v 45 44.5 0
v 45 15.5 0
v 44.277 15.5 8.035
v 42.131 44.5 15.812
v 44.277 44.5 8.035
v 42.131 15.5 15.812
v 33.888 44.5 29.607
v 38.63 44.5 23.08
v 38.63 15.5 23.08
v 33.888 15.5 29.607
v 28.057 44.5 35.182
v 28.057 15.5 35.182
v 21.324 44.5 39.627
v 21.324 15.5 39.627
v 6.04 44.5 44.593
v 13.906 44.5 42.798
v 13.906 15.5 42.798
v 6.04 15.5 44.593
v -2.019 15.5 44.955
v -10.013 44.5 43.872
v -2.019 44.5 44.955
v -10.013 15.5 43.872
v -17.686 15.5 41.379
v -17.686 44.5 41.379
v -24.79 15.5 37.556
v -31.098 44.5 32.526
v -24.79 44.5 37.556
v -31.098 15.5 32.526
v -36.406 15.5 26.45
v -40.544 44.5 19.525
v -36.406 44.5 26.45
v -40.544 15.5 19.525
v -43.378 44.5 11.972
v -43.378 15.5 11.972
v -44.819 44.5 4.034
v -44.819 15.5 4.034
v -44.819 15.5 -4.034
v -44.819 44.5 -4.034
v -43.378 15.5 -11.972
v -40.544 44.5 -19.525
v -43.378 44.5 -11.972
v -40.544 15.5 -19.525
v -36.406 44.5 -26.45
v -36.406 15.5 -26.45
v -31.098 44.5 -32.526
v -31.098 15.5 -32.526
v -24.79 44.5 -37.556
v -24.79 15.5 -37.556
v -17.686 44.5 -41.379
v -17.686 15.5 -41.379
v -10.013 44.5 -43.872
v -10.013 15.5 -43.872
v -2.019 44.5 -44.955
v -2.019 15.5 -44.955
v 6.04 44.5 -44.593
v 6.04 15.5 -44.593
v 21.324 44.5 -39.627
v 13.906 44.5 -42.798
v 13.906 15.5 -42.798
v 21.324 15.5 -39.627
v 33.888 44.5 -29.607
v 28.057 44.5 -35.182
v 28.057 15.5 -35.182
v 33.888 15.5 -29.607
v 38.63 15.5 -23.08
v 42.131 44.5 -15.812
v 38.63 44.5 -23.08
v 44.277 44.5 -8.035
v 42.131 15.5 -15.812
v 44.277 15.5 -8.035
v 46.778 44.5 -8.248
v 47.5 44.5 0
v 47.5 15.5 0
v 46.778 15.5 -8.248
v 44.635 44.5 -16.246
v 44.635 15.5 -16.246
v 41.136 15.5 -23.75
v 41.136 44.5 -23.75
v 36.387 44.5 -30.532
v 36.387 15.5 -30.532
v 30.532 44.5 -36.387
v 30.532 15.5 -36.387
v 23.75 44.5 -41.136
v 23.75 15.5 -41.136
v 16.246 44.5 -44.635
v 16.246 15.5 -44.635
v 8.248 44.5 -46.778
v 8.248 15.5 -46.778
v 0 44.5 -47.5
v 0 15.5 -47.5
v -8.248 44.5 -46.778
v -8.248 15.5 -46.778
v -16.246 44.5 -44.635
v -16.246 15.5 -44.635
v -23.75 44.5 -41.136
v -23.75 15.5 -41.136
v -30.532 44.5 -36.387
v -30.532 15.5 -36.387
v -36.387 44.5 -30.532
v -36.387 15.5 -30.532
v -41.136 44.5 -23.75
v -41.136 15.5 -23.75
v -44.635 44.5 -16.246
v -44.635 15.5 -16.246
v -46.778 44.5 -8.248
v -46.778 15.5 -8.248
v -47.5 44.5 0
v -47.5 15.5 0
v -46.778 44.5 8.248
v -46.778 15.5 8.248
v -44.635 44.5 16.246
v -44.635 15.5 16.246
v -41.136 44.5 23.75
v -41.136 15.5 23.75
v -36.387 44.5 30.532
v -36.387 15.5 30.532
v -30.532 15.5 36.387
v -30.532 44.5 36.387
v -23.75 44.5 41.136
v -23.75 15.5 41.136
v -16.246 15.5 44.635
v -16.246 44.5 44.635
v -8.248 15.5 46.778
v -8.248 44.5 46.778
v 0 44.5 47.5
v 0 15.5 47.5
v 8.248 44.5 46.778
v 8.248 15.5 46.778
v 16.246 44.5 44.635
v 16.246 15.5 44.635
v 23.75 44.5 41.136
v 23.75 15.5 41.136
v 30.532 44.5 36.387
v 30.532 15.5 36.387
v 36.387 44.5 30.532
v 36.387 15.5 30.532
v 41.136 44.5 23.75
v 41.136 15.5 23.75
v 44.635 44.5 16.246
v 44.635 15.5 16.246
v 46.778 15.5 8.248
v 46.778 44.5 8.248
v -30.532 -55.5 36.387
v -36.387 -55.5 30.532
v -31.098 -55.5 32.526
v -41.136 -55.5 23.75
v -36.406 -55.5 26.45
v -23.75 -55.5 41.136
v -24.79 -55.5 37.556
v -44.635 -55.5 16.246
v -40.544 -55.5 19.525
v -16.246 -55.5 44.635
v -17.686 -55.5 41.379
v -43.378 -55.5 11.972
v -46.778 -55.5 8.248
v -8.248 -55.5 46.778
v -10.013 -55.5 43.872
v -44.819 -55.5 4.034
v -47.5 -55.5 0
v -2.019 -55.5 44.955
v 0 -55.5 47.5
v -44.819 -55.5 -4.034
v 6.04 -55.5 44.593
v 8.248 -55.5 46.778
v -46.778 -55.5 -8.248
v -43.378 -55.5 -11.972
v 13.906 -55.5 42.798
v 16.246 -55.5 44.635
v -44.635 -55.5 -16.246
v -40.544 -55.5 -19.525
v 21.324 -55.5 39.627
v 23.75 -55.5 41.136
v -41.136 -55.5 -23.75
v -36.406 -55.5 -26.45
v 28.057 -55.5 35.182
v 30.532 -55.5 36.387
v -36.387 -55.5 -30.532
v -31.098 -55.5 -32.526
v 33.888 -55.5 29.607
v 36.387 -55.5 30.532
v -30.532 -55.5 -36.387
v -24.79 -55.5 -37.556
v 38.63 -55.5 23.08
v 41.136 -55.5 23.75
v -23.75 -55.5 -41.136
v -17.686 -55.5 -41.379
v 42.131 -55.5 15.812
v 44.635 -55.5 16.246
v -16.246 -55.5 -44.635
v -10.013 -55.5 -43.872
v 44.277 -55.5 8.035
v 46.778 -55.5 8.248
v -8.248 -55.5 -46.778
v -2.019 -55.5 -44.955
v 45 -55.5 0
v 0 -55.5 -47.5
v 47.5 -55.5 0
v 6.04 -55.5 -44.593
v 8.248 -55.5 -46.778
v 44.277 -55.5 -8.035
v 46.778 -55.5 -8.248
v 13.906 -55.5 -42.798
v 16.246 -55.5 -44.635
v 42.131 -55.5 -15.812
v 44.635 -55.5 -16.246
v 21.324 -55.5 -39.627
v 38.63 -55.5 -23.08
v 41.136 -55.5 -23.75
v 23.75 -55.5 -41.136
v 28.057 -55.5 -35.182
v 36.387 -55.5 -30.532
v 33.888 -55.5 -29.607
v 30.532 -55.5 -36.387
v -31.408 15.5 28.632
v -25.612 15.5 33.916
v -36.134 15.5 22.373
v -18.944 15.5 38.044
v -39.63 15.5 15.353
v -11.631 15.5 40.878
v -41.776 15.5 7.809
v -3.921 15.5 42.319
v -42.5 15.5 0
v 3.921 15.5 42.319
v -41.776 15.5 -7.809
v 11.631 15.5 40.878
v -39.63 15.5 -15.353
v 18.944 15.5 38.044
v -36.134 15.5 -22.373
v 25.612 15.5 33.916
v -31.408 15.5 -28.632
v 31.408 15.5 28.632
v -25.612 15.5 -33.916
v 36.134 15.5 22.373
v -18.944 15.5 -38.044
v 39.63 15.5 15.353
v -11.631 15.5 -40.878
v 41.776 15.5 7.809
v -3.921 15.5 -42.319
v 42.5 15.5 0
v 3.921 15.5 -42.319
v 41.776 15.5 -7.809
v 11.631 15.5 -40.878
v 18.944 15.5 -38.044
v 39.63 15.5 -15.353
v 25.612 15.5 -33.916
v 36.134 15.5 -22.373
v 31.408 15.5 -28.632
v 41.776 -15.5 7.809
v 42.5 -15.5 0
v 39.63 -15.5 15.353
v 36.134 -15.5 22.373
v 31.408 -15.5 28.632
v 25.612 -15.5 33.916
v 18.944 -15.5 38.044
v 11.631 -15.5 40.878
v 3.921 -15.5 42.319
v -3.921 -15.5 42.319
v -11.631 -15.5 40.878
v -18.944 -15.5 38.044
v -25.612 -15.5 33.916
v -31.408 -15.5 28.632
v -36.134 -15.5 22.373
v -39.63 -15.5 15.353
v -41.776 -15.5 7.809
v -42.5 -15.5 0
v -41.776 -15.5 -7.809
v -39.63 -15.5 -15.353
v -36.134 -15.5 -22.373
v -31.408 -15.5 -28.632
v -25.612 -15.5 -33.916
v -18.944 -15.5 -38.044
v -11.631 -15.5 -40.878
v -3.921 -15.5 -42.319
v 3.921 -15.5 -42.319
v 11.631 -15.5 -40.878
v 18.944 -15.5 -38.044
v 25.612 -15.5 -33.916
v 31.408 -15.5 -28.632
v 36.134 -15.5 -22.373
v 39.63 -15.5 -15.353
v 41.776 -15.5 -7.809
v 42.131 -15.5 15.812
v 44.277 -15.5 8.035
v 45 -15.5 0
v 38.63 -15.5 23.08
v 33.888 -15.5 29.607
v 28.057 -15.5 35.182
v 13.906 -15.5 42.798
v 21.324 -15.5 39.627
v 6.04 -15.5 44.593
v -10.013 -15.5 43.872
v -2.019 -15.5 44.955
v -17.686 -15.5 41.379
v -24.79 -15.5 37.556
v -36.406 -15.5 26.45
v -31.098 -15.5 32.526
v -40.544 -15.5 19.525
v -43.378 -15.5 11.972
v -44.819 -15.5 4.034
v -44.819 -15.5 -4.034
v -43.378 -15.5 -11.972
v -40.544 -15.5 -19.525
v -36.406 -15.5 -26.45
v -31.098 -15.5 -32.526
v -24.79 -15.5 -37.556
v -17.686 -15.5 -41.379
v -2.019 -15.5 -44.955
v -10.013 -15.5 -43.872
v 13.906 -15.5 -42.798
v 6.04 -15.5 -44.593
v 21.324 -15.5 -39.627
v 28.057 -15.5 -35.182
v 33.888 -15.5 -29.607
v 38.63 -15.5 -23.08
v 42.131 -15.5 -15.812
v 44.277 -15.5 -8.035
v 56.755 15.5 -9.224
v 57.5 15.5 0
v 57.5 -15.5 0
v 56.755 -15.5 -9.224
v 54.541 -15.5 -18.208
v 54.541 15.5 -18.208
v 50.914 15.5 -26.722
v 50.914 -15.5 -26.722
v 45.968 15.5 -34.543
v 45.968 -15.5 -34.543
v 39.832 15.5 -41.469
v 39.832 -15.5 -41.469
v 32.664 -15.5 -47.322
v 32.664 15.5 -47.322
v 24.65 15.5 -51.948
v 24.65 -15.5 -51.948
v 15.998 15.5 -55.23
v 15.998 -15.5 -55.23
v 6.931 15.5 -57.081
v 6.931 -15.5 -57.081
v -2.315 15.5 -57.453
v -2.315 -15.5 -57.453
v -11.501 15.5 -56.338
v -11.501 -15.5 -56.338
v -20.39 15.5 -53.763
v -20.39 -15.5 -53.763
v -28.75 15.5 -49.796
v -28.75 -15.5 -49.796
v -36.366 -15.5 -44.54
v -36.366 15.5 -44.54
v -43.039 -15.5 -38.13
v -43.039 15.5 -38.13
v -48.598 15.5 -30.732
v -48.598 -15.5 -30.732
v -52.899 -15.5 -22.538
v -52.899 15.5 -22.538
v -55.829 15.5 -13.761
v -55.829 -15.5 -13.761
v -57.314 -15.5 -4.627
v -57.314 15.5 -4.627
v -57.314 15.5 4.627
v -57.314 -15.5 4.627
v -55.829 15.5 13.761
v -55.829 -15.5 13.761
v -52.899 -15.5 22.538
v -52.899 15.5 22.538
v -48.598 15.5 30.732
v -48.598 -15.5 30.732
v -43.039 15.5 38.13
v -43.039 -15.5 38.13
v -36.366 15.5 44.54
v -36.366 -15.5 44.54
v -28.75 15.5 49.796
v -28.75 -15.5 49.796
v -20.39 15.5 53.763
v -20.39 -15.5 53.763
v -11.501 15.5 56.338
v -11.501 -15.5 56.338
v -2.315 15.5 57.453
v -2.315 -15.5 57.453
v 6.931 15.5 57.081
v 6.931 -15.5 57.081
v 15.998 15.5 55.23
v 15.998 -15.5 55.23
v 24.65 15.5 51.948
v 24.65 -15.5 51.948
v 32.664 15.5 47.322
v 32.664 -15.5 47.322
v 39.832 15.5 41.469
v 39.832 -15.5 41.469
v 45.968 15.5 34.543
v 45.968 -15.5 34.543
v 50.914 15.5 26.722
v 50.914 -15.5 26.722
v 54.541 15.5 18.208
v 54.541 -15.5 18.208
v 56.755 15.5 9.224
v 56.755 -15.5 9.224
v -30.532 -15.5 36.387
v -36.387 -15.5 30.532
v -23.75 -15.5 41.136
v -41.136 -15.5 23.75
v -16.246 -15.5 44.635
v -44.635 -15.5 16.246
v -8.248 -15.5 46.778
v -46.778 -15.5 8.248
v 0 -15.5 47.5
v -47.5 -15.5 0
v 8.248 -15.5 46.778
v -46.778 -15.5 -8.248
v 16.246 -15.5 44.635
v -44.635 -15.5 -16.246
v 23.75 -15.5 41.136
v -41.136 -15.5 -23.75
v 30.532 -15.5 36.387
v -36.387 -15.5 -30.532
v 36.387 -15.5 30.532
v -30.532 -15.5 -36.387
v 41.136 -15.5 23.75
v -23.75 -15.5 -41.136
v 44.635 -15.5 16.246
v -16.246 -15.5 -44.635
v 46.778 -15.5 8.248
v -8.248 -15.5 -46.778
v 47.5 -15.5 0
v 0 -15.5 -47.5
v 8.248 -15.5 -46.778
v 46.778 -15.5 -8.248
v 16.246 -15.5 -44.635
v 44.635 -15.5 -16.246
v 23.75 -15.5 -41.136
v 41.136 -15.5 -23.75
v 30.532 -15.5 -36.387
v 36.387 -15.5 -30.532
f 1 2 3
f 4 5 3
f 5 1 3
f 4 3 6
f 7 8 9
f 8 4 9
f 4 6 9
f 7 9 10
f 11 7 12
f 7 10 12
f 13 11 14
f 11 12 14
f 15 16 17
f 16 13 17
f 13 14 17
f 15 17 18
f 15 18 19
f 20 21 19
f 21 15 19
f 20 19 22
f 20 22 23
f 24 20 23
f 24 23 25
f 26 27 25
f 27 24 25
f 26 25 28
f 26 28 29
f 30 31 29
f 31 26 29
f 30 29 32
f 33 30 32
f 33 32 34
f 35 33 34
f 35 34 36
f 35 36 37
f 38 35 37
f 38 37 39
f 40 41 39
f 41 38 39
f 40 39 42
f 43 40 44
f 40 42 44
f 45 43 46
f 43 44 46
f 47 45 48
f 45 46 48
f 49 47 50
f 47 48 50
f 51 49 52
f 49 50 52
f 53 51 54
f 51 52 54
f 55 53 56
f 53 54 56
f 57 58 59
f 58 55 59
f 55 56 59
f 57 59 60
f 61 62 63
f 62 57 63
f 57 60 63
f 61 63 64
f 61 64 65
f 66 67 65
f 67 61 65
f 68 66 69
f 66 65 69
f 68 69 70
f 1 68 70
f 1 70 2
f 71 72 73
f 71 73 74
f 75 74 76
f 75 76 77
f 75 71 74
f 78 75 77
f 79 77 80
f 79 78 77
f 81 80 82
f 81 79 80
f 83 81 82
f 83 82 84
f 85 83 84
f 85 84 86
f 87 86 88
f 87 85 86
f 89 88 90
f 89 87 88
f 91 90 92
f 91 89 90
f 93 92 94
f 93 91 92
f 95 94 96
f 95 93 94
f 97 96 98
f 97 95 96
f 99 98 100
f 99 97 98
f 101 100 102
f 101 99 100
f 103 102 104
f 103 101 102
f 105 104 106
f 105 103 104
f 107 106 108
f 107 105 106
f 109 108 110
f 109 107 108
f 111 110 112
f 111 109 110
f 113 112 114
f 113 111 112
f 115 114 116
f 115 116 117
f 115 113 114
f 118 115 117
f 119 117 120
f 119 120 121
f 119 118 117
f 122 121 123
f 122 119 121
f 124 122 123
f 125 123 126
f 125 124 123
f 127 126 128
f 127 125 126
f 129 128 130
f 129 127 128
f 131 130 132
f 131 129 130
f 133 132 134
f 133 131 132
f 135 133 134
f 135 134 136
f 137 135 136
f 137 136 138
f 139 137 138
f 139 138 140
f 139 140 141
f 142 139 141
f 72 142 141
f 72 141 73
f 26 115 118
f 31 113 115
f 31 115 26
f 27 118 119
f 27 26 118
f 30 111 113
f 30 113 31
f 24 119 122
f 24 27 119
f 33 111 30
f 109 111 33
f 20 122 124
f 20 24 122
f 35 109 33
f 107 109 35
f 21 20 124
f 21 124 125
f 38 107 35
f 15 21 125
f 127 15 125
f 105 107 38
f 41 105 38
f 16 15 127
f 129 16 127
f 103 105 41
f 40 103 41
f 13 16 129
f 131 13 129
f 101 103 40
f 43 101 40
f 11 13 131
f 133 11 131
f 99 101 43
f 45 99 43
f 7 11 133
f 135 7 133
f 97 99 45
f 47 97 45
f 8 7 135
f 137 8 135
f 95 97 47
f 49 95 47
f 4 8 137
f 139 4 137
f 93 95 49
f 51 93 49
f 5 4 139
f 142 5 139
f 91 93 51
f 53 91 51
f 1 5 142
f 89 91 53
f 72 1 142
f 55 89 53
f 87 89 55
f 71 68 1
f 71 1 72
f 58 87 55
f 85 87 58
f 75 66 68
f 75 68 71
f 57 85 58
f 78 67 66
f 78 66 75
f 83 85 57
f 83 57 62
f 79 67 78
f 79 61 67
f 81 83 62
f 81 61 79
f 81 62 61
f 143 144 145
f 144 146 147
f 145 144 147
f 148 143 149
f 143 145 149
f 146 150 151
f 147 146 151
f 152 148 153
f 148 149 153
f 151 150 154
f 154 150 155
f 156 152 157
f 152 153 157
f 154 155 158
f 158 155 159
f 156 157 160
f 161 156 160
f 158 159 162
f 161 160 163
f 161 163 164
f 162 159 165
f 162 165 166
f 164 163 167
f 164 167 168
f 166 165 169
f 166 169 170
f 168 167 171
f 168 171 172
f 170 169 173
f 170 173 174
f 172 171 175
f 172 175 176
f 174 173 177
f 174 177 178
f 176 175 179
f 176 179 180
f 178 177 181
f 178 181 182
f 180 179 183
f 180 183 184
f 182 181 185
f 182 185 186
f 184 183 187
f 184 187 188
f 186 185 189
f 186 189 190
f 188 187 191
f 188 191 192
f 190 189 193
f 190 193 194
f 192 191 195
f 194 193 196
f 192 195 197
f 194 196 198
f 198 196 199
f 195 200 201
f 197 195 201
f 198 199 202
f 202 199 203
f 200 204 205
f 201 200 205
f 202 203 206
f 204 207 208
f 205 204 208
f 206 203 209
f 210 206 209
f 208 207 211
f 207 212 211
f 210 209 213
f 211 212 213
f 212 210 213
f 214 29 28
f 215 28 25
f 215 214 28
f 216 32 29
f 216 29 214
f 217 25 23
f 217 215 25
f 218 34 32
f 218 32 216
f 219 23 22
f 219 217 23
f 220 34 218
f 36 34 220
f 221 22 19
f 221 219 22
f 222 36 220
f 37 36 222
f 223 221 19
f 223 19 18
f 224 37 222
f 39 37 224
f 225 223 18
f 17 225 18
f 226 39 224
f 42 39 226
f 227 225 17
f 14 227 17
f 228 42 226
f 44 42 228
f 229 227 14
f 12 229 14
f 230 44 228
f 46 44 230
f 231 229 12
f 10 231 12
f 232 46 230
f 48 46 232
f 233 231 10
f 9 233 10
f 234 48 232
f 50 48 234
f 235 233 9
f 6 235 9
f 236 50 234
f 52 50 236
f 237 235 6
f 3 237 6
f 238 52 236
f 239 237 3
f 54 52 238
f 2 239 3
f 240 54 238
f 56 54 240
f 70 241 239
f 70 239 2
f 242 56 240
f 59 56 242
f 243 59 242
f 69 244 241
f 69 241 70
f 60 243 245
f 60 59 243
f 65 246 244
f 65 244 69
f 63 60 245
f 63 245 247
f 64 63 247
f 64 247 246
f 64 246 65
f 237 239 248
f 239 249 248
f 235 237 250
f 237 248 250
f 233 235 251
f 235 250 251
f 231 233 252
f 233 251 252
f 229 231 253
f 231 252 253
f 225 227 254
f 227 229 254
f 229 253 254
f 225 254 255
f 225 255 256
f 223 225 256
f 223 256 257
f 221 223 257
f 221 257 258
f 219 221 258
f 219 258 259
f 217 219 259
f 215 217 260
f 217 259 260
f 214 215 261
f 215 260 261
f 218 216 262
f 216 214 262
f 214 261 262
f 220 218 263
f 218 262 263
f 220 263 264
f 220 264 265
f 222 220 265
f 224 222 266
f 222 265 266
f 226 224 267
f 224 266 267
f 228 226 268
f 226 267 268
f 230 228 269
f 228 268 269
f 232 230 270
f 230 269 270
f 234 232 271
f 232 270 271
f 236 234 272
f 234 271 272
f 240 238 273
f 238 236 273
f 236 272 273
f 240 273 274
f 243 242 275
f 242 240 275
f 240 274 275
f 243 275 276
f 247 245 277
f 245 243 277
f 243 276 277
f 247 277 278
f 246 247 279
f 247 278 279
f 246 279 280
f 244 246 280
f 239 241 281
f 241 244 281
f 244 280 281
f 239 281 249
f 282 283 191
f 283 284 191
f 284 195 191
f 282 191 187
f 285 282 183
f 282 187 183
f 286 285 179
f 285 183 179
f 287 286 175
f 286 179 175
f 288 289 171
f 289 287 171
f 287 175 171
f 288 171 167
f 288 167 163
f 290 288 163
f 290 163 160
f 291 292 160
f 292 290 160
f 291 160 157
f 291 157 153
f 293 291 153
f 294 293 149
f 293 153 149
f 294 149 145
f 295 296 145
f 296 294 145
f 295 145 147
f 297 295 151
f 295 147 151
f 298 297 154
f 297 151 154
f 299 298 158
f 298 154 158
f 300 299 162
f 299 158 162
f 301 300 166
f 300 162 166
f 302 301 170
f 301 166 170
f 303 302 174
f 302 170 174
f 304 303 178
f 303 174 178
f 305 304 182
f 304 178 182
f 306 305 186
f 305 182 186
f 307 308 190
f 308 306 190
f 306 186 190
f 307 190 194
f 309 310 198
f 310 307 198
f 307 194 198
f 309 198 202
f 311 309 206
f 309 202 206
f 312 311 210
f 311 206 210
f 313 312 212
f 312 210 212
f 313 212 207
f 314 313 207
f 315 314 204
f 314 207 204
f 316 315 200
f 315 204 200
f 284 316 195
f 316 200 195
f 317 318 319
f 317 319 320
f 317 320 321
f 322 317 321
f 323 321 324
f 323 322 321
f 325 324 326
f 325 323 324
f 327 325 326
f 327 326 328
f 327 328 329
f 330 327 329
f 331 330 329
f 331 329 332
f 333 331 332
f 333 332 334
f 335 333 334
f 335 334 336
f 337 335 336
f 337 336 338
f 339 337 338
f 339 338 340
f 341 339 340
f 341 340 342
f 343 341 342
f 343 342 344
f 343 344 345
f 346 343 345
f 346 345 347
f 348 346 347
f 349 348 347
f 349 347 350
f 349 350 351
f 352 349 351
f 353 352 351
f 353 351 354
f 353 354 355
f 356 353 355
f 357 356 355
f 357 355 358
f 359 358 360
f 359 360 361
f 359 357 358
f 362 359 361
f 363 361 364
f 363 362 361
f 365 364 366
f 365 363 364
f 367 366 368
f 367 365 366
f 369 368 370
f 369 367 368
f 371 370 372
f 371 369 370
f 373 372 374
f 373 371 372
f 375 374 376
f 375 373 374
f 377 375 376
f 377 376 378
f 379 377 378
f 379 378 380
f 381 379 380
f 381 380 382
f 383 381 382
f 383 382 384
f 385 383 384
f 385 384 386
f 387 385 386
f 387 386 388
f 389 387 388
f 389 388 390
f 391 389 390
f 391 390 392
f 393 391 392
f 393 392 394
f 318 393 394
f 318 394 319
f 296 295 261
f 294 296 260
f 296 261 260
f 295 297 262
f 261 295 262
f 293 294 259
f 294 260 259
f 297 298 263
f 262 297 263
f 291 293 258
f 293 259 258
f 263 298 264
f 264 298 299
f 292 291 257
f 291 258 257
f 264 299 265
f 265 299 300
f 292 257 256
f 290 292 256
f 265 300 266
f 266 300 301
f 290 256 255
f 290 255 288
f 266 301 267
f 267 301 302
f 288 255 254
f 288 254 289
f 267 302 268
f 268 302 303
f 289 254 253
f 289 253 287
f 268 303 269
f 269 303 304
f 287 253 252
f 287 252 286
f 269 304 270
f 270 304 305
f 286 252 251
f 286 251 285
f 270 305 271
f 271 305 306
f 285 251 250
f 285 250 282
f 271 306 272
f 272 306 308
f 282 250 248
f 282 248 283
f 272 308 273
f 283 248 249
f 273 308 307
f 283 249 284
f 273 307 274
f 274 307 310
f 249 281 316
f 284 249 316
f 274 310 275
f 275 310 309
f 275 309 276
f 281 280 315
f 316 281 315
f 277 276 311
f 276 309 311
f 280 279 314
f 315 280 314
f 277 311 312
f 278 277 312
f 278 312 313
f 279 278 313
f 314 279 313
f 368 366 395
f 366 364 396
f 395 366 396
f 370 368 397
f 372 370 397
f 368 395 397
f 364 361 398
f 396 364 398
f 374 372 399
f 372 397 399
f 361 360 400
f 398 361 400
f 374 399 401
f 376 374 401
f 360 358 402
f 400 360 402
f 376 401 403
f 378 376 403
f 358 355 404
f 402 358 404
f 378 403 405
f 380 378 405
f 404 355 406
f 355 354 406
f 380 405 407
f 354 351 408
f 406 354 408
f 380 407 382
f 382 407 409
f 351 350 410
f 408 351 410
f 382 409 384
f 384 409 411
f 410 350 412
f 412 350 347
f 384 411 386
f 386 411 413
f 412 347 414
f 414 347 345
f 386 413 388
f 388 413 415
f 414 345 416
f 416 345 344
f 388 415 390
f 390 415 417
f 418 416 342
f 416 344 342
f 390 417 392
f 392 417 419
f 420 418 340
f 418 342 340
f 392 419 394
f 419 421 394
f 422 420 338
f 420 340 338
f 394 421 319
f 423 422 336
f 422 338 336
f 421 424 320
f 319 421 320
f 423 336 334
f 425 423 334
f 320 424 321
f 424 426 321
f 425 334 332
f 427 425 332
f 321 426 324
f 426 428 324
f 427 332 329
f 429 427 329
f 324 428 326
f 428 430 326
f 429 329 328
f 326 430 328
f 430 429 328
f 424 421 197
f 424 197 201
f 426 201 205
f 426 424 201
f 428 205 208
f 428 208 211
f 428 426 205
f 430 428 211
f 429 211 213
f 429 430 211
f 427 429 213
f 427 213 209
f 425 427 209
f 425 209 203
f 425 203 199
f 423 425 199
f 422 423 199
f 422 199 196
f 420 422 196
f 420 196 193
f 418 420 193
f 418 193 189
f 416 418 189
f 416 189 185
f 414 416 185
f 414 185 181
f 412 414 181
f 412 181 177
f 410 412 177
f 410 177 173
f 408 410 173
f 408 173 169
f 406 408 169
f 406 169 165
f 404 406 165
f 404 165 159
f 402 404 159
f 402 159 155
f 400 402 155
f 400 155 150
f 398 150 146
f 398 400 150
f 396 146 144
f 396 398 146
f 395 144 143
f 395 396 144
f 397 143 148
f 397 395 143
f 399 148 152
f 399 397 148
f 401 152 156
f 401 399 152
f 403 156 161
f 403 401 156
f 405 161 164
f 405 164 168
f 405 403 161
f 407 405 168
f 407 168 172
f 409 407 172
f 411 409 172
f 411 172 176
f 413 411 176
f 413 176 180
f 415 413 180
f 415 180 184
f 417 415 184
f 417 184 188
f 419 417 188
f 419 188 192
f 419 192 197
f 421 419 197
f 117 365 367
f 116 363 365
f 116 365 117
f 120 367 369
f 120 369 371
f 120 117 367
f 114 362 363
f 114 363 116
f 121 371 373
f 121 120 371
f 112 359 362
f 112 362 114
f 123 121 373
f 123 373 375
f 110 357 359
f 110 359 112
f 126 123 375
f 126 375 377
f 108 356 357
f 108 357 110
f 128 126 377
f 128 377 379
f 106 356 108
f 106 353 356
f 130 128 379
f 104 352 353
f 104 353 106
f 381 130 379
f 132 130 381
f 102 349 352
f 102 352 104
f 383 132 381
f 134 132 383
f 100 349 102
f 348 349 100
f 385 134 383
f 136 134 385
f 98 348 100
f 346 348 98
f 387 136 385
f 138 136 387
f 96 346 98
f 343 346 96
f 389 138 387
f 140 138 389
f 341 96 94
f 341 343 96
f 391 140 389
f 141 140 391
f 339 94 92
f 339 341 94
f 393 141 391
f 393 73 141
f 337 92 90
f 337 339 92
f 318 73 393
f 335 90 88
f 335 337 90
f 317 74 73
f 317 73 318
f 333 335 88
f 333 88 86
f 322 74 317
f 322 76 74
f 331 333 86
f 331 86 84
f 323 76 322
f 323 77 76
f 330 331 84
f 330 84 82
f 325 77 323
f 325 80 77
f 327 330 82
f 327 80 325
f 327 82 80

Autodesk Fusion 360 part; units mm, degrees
sketch "Sketch1" plane through (0, 0, 0) normal (0, 0, 1) x (1, 0, 0)
  circle A0 centre (74.5, 0) radius 2
  dimension "d1" = 4
  dimension "d2" = 74.5
revolve "Revolve1" add sketch "Sketch1" angle 360 about axis through (0, 1.75, 0) along (0, 1, 0)
equation "d2 = ( 145 / 2 ) * 1 mm + 2 mm"

Autodesk Fusion 360 part; units mm, degrees
sketch "Sketch1" plane through (0, 0, 0) normal (0, 0, 1) x (1, 0, 0)
  line L0 (45, 44.5) -> (45, -55.5)
  line L1 (45, -55.5) -> (47.5, -55.5)
  line L2 (47.5, -55.5) -> (47.5, -15.5)
  line L3 (47.5, -15.5) -> (57.5, -15.5)
  line L4 (57.5, -15.5) -> (57.5, 15.5)
  line L5 (57.5, 15.5) -> (47.5, 15.5)
  line L6 (47.5, 15.5) -> (47.5, 44.5)
  line L7 (47.5, 44.5) -> (45, 44.5)
  line L8 (0, 0) -> (57.5, 0) construction
  line L9 (45, 15.5) -> (42.5, 15.5)
  line L10 (42.5, 15.5) -> (42.5, -15.5)
  line L11 (42.5, -15.5) -> (45, -15.5)
  dimension "d1" = 45
  dimension "d2" = 47.5
  dimension "d4" = 31
  dimension "d8" = 29
  dimension "d9" = 40
  dimension "d10" = 100
  dimension "d11" = 57.5
  dimension "d12" = 42.5
revolve "Revolve1" add sketch "Sketch1" angle 360 about axis through (0, 1.75, 0) along (0, 1, 0)
equation "d1 = ( 90 / 2 ) * 1 mm"
equation "d2 = ( 95 / 2 ) * 1 mm"
equation "d11 = ( 115 / 2 ) * 1 mm"
equation "d12 = ( 85 / 2 ) * 1 mm"
